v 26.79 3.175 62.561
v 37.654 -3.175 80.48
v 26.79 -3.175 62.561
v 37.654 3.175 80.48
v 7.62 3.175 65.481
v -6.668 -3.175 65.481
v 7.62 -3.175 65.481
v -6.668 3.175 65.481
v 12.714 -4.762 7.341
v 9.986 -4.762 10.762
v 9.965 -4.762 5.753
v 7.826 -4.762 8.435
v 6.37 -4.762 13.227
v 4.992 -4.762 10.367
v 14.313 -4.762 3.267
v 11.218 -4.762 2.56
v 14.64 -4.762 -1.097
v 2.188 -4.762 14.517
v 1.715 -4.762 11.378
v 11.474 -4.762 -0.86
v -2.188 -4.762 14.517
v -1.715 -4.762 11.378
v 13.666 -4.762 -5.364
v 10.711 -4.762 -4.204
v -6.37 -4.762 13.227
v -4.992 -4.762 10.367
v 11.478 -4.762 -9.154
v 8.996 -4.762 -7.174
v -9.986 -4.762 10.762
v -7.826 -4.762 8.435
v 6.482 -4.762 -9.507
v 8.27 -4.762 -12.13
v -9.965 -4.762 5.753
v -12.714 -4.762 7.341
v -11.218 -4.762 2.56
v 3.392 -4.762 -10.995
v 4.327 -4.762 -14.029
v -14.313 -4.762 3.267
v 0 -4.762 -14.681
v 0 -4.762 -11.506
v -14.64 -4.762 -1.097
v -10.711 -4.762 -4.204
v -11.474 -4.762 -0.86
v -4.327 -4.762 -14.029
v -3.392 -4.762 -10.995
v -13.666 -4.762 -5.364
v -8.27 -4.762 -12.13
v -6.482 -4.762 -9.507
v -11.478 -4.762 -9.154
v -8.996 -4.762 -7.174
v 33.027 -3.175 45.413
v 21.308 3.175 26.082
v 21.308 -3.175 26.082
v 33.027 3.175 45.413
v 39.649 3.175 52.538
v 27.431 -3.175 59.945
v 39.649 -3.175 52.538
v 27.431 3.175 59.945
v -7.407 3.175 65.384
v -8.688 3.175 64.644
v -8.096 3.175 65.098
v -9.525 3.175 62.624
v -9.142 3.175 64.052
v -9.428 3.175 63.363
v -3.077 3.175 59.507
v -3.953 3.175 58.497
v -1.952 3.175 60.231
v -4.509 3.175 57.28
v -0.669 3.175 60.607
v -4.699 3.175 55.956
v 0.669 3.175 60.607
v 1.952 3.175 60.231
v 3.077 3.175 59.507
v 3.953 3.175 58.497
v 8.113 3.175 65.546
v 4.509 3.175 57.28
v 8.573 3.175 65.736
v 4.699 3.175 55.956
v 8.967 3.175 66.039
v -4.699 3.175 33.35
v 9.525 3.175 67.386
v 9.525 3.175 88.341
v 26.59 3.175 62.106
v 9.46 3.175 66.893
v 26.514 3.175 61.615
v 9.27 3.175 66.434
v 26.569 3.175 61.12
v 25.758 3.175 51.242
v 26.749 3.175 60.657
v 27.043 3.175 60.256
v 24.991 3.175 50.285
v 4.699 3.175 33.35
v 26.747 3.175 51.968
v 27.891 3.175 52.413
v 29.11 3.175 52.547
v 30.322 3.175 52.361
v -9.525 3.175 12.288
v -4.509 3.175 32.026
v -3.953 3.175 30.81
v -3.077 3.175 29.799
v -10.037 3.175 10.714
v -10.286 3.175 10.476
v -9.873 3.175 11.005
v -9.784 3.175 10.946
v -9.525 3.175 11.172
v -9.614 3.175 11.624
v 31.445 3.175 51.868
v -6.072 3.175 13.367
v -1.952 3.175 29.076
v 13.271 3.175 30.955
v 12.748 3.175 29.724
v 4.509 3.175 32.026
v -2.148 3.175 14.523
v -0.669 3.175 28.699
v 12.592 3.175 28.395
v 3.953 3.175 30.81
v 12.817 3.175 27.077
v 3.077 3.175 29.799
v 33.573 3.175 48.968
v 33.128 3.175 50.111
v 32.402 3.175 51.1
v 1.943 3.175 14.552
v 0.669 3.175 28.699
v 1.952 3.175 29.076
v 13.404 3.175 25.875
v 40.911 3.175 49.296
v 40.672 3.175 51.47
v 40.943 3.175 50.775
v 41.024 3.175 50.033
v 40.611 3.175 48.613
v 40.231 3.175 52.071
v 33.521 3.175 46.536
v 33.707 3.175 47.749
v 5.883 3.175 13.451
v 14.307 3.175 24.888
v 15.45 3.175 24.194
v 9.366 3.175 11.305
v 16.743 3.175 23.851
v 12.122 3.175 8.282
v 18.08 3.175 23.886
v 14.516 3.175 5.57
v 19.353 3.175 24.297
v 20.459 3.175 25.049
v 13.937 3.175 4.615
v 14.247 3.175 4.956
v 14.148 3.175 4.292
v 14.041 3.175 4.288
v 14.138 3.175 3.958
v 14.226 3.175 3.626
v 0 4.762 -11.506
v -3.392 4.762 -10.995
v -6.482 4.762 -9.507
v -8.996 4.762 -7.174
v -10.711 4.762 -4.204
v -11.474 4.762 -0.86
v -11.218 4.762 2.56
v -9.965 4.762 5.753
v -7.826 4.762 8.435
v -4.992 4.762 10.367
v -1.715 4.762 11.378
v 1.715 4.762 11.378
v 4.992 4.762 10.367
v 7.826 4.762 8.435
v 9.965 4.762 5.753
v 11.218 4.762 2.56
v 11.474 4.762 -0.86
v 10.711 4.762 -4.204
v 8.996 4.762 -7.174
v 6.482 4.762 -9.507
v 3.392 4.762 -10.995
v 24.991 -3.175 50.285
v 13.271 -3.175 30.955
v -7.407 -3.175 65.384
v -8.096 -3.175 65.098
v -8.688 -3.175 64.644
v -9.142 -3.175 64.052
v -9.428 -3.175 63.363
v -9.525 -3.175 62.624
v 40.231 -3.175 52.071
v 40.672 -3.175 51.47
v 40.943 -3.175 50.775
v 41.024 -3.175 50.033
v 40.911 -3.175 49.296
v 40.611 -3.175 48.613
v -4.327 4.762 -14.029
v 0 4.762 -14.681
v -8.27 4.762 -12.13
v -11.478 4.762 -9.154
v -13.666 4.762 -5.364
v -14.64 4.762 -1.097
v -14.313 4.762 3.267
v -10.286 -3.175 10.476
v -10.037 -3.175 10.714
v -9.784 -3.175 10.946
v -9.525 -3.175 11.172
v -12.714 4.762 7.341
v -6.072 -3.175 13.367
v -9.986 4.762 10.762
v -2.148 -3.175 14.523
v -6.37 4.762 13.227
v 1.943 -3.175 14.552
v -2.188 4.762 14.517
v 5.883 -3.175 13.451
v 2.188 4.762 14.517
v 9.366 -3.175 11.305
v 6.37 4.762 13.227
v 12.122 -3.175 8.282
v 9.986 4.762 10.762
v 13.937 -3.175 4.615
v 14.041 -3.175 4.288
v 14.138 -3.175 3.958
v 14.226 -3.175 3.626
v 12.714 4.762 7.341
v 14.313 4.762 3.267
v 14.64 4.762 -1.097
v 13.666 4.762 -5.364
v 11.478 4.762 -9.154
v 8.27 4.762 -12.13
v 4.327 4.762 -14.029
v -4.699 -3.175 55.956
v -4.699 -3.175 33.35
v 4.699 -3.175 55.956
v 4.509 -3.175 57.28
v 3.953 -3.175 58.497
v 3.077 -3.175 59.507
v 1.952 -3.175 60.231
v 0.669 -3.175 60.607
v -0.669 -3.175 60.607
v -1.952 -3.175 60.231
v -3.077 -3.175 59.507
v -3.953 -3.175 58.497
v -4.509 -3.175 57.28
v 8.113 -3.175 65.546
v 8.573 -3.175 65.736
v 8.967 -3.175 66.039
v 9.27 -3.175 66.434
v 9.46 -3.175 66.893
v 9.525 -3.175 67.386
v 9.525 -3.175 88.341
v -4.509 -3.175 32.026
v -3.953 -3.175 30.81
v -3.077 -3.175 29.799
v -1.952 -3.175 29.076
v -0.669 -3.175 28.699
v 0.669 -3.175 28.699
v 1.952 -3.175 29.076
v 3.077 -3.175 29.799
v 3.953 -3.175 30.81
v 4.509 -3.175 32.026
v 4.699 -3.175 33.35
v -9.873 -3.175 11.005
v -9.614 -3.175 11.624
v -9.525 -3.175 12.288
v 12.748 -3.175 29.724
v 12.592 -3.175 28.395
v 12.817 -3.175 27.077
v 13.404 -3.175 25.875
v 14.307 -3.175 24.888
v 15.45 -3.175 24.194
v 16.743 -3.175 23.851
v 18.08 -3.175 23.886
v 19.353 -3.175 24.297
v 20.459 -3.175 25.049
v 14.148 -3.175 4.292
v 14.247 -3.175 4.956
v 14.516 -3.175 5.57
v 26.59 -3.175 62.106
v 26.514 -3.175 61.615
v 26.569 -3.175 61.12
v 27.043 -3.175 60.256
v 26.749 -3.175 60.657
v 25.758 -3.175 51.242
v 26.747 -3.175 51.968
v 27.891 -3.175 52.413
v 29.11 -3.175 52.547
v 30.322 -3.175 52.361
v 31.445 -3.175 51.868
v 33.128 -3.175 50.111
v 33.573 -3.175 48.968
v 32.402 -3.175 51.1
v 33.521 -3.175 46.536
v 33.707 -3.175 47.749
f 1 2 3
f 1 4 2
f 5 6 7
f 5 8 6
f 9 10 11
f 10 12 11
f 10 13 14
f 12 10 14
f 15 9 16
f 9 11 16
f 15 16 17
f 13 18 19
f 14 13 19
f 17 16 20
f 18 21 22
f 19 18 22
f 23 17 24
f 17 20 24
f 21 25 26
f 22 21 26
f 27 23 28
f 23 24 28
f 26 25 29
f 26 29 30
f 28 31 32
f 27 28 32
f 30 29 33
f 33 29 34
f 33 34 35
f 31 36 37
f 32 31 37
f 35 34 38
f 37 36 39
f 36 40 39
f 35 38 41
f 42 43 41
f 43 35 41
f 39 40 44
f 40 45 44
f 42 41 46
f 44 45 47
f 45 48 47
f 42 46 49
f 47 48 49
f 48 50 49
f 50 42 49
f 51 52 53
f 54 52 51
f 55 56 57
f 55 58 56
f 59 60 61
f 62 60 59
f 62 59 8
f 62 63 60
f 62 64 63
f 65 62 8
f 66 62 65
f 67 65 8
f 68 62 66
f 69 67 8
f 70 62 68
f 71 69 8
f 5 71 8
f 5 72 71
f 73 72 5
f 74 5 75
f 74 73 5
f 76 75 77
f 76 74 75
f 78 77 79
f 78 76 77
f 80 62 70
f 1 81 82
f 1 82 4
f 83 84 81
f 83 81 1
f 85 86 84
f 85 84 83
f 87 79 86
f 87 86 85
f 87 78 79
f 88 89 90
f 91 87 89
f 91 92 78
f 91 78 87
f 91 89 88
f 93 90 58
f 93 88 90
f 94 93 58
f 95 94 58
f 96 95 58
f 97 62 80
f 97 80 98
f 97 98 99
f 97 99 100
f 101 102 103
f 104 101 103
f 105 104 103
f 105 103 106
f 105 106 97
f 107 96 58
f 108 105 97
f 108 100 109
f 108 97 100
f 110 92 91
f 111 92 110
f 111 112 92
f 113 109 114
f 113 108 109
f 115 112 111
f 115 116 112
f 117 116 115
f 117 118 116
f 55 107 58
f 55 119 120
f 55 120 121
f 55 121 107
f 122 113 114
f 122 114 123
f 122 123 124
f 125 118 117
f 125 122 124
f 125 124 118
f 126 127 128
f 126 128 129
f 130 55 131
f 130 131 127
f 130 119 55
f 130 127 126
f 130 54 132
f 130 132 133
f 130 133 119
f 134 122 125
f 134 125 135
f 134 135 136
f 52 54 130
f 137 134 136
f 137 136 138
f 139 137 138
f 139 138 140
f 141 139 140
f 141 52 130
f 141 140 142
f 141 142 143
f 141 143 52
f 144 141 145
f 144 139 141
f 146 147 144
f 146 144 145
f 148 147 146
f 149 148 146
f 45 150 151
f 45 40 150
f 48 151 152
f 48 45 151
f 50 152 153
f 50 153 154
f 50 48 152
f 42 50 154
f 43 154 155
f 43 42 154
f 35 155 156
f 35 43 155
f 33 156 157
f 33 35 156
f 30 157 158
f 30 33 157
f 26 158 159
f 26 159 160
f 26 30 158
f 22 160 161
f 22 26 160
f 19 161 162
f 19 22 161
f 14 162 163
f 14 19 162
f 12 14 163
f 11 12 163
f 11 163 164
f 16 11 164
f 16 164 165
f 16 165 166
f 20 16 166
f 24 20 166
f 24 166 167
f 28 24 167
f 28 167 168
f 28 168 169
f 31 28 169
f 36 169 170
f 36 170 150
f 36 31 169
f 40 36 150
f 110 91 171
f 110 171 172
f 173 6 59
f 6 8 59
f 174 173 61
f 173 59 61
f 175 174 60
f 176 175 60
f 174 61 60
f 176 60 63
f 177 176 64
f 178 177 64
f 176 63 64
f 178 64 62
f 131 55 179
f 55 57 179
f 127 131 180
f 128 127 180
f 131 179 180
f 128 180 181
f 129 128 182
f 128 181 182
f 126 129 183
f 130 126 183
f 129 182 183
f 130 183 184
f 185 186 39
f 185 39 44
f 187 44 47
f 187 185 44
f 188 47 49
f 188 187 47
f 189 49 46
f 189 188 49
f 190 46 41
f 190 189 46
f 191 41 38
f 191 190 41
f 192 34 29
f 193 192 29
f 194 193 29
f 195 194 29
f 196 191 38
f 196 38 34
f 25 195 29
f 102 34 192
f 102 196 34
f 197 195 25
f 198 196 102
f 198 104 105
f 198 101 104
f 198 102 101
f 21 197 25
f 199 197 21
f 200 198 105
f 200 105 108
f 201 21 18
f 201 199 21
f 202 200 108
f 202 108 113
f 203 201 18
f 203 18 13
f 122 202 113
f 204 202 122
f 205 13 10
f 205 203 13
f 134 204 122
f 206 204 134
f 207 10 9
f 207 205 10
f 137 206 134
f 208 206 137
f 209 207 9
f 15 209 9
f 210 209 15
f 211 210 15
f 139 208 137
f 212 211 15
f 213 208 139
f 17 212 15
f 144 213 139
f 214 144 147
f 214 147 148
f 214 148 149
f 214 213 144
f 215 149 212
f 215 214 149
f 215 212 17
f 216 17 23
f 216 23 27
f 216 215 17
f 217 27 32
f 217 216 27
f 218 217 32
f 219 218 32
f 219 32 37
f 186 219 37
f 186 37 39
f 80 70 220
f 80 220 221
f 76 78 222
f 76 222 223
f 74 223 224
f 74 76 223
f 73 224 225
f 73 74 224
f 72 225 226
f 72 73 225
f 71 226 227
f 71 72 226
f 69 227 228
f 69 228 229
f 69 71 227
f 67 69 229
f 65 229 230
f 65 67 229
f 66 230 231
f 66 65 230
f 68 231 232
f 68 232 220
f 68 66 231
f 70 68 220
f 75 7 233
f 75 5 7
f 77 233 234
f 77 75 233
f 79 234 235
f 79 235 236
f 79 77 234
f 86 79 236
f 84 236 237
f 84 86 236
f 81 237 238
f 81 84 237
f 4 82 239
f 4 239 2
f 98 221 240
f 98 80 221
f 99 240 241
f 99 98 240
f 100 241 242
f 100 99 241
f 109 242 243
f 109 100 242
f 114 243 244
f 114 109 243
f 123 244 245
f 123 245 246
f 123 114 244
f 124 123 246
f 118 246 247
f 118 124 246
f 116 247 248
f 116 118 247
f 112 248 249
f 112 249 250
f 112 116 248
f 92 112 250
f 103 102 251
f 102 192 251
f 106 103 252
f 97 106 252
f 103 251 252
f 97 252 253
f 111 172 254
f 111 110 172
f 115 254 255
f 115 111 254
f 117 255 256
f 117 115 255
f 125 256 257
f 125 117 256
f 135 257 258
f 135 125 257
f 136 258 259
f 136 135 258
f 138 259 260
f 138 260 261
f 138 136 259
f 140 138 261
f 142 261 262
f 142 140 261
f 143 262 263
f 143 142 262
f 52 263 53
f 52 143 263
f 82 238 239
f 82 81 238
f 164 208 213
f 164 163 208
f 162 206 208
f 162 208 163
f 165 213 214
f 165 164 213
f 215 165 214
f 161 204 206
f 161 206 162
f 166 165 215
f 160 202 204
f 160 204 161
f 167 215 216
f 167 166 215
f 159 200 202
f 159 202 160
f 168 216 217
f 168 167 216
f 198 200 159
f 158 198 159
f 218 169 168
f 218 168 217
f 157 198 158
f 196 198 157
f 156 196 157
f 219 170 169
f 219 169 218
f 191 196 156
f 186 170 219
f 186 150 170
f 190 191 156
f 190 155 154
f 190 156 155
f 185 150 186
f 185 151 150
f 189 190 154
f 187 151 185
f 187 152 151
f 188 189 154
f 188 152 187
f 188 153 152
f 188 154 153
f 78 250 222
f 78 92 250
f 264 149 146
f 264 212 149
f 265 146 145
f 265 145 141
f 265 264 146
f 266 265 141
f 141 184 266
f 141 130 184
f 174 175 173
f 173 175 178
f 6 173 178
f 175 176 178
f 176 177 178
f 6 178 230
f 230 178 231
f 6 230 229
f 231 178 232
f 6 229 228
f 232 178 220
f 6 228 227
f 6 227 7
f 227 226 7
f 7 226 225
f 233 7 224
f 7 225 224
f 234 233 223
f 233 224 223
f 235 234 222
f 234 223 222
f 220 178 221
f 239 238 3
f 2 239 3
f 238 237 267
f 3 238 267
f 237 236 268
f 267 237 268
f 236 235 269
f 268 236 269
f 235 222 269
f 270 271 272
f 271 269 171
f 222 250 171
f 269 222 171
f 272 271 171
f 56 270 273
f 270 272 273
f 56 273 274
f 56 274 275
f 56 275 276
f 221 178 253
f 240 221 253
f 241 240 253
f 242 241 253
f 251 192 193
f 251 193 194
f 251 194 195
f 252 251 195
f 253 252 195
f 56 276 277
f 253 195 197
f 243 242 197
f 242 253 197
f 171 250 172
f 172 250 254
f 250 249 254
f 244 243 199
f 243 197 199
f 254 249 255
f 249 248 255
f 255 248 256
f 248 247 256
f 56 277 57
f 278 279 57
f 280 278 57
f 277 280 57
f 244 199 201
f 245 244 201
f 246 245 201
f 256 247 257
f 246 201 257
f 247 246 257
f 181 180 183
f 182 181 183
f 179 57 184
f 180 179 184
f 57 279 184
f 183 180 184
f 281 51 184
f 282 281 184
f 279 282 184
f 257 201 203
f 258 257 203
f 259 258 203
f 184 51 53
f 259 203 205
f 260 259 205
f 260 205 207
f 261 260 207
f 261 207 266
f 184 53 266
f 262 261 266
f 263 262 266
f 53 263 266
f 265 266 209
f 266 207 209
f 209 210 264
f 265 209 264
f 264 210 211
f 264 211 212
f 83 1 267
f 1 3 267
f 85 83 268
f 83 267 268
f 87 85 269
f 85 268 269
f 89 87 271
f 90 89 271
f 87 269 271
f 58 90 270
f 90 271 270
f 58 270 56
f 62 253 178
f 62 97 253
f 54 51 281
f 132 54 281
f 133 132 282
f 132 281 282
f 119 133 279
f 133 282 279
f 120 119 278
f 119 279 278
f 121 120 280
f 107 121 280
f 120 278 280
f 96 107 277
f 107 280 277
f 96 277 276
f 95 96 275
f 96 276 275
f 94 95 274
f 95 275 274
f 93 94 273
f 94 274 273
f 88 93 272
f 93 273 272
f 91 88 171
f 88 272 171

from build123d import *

# Parameters (mm, degrees)
SKETCH1_R             = 14.6812
SKETCH1_R_2           = 11.5062
BEARING_EXTRUDE_DEPTH = 4.7625
BOSS_EXTRUDE2_DEPTH   = 3.175
FILLET1_R             = 2.54
FILLET2_R             = 1.905
FILLET3_R             = 2.8575


with BuildPart() as part:
    # Sketch1 → Bearing extrude (new, symmetric)
    with BuildSketch(Plane(origin=(0, 0, 0), x_dir=(1, 0, 0), z_dir=(0, 1, 0))):
        with Locations(Location((0, 0, 0), (0, 0, 90))):
            Circle(SKETCH1_R)
        with Locations(Location((0, 0, 0), (0, 0, 90))):
            Circle(SKETCH1_R_2, mode=Mode.SUBTRACT)
    extrude(amount=BEARING_EXTRUDE_DEPTH, both=True)

    # Sketch1<5> → Boss-Extrude2 (add, symmetric)
    with BuildSketch(Plane(origin=(0, 0, 0), x_dir=(1, 0, 0), z_dir=(0, 1, 0))):
        with BuildLine():
            Line((-9.525, -11.171929486), (-9.525, -65.4812))
            Line((-9.525, -65.4812), (9.525, -65.4812))
            Line((9.525, -65.4812), (9.525, -88.3412))
            Line((9.525, -88.3412), (37.653512805, -80.480471022))
            Line((37.653512805, -80.480471022), (25.802250815, -60.932397223))
            Line((25.802250815, -60.932397223), (33.947281565, -55.994371394))
            Line((33.947281565, -55.994371394), (42.092312315, -51.056345565))
            Line((42.092312315, -51.056345565), (13.936870788, -4.615329467))
            ThreePointArc((13.936870788, -4.615329467), (3.951379748, -14.13945655), (-9.525, -11.171929486))
        make_face()
        with BuildLine():
            ThreePointArc((4.699, -55.9562), (0, -60.6552), (-4.699, -55.9562))
            Line((-4.699, -55.9562), (-4.699, -33.3502))
            ThreePointArc((-4.699, -33.3502), (0, -28.6512), (4.699, -33.3502))
            Line((4.699, -33.3502), (4.699, -55.9562))
        make_face(mode=Mode.SUBTRACT)
        with BuildLine():
            ThreePointArc((33.027470906, -45.413247902), (33.573140629, -48.968070141), (31.445348478, -51.867555814))
            ThreePointArc((31.445348478, -51.867555814), (27.890526239, -52.413225537), (24.991040566, -50.285433386))
            Line((24.991040566, -50.285433386), (13.271459266, -30.954560407))
            ThreePointArc((13.271459266, -30.954560407), (14.853581693, -24.500252495), (21.307889605, -26.082374923))
            Line((21.307889605, -26.082374923), (33.027470906, -45.413247902))
        make_face(mode=Mode.SUBTRACT)
    extrude(amount=BOSS_EXTRUDE2_DEPTH, both=True)

    # Fillet1
    fillet1_edges = [part.edges().sort_by_distance(p)[0] for p in [
        (13.936870788, 0, 4.615329467),
        (-9.525, 0, 11.171929486),
    ]]
    fillet(fillet1_edges, radius=FILLET1_R)

    # Fillet2
    fillet2_edges = [part.edges().sort_by_distance(p)[0] for p in [
        (25.802250815, 0, 60.932397223),
        (9.525, 0, 65.4812),
    ]]
    fillet(fillet2_edges, radius=FILLET2_R)

    # Fillet3
    fillet3_edges = [part.edges().sort_by_distance(p)[0] for p in [
        (42.092312315, 0, 51.056345565),
        (-9.525, 0, 65.4812),
    ]]
    fillet(fillet3_edges, radius=FILLET3_R)


solid = part.part
